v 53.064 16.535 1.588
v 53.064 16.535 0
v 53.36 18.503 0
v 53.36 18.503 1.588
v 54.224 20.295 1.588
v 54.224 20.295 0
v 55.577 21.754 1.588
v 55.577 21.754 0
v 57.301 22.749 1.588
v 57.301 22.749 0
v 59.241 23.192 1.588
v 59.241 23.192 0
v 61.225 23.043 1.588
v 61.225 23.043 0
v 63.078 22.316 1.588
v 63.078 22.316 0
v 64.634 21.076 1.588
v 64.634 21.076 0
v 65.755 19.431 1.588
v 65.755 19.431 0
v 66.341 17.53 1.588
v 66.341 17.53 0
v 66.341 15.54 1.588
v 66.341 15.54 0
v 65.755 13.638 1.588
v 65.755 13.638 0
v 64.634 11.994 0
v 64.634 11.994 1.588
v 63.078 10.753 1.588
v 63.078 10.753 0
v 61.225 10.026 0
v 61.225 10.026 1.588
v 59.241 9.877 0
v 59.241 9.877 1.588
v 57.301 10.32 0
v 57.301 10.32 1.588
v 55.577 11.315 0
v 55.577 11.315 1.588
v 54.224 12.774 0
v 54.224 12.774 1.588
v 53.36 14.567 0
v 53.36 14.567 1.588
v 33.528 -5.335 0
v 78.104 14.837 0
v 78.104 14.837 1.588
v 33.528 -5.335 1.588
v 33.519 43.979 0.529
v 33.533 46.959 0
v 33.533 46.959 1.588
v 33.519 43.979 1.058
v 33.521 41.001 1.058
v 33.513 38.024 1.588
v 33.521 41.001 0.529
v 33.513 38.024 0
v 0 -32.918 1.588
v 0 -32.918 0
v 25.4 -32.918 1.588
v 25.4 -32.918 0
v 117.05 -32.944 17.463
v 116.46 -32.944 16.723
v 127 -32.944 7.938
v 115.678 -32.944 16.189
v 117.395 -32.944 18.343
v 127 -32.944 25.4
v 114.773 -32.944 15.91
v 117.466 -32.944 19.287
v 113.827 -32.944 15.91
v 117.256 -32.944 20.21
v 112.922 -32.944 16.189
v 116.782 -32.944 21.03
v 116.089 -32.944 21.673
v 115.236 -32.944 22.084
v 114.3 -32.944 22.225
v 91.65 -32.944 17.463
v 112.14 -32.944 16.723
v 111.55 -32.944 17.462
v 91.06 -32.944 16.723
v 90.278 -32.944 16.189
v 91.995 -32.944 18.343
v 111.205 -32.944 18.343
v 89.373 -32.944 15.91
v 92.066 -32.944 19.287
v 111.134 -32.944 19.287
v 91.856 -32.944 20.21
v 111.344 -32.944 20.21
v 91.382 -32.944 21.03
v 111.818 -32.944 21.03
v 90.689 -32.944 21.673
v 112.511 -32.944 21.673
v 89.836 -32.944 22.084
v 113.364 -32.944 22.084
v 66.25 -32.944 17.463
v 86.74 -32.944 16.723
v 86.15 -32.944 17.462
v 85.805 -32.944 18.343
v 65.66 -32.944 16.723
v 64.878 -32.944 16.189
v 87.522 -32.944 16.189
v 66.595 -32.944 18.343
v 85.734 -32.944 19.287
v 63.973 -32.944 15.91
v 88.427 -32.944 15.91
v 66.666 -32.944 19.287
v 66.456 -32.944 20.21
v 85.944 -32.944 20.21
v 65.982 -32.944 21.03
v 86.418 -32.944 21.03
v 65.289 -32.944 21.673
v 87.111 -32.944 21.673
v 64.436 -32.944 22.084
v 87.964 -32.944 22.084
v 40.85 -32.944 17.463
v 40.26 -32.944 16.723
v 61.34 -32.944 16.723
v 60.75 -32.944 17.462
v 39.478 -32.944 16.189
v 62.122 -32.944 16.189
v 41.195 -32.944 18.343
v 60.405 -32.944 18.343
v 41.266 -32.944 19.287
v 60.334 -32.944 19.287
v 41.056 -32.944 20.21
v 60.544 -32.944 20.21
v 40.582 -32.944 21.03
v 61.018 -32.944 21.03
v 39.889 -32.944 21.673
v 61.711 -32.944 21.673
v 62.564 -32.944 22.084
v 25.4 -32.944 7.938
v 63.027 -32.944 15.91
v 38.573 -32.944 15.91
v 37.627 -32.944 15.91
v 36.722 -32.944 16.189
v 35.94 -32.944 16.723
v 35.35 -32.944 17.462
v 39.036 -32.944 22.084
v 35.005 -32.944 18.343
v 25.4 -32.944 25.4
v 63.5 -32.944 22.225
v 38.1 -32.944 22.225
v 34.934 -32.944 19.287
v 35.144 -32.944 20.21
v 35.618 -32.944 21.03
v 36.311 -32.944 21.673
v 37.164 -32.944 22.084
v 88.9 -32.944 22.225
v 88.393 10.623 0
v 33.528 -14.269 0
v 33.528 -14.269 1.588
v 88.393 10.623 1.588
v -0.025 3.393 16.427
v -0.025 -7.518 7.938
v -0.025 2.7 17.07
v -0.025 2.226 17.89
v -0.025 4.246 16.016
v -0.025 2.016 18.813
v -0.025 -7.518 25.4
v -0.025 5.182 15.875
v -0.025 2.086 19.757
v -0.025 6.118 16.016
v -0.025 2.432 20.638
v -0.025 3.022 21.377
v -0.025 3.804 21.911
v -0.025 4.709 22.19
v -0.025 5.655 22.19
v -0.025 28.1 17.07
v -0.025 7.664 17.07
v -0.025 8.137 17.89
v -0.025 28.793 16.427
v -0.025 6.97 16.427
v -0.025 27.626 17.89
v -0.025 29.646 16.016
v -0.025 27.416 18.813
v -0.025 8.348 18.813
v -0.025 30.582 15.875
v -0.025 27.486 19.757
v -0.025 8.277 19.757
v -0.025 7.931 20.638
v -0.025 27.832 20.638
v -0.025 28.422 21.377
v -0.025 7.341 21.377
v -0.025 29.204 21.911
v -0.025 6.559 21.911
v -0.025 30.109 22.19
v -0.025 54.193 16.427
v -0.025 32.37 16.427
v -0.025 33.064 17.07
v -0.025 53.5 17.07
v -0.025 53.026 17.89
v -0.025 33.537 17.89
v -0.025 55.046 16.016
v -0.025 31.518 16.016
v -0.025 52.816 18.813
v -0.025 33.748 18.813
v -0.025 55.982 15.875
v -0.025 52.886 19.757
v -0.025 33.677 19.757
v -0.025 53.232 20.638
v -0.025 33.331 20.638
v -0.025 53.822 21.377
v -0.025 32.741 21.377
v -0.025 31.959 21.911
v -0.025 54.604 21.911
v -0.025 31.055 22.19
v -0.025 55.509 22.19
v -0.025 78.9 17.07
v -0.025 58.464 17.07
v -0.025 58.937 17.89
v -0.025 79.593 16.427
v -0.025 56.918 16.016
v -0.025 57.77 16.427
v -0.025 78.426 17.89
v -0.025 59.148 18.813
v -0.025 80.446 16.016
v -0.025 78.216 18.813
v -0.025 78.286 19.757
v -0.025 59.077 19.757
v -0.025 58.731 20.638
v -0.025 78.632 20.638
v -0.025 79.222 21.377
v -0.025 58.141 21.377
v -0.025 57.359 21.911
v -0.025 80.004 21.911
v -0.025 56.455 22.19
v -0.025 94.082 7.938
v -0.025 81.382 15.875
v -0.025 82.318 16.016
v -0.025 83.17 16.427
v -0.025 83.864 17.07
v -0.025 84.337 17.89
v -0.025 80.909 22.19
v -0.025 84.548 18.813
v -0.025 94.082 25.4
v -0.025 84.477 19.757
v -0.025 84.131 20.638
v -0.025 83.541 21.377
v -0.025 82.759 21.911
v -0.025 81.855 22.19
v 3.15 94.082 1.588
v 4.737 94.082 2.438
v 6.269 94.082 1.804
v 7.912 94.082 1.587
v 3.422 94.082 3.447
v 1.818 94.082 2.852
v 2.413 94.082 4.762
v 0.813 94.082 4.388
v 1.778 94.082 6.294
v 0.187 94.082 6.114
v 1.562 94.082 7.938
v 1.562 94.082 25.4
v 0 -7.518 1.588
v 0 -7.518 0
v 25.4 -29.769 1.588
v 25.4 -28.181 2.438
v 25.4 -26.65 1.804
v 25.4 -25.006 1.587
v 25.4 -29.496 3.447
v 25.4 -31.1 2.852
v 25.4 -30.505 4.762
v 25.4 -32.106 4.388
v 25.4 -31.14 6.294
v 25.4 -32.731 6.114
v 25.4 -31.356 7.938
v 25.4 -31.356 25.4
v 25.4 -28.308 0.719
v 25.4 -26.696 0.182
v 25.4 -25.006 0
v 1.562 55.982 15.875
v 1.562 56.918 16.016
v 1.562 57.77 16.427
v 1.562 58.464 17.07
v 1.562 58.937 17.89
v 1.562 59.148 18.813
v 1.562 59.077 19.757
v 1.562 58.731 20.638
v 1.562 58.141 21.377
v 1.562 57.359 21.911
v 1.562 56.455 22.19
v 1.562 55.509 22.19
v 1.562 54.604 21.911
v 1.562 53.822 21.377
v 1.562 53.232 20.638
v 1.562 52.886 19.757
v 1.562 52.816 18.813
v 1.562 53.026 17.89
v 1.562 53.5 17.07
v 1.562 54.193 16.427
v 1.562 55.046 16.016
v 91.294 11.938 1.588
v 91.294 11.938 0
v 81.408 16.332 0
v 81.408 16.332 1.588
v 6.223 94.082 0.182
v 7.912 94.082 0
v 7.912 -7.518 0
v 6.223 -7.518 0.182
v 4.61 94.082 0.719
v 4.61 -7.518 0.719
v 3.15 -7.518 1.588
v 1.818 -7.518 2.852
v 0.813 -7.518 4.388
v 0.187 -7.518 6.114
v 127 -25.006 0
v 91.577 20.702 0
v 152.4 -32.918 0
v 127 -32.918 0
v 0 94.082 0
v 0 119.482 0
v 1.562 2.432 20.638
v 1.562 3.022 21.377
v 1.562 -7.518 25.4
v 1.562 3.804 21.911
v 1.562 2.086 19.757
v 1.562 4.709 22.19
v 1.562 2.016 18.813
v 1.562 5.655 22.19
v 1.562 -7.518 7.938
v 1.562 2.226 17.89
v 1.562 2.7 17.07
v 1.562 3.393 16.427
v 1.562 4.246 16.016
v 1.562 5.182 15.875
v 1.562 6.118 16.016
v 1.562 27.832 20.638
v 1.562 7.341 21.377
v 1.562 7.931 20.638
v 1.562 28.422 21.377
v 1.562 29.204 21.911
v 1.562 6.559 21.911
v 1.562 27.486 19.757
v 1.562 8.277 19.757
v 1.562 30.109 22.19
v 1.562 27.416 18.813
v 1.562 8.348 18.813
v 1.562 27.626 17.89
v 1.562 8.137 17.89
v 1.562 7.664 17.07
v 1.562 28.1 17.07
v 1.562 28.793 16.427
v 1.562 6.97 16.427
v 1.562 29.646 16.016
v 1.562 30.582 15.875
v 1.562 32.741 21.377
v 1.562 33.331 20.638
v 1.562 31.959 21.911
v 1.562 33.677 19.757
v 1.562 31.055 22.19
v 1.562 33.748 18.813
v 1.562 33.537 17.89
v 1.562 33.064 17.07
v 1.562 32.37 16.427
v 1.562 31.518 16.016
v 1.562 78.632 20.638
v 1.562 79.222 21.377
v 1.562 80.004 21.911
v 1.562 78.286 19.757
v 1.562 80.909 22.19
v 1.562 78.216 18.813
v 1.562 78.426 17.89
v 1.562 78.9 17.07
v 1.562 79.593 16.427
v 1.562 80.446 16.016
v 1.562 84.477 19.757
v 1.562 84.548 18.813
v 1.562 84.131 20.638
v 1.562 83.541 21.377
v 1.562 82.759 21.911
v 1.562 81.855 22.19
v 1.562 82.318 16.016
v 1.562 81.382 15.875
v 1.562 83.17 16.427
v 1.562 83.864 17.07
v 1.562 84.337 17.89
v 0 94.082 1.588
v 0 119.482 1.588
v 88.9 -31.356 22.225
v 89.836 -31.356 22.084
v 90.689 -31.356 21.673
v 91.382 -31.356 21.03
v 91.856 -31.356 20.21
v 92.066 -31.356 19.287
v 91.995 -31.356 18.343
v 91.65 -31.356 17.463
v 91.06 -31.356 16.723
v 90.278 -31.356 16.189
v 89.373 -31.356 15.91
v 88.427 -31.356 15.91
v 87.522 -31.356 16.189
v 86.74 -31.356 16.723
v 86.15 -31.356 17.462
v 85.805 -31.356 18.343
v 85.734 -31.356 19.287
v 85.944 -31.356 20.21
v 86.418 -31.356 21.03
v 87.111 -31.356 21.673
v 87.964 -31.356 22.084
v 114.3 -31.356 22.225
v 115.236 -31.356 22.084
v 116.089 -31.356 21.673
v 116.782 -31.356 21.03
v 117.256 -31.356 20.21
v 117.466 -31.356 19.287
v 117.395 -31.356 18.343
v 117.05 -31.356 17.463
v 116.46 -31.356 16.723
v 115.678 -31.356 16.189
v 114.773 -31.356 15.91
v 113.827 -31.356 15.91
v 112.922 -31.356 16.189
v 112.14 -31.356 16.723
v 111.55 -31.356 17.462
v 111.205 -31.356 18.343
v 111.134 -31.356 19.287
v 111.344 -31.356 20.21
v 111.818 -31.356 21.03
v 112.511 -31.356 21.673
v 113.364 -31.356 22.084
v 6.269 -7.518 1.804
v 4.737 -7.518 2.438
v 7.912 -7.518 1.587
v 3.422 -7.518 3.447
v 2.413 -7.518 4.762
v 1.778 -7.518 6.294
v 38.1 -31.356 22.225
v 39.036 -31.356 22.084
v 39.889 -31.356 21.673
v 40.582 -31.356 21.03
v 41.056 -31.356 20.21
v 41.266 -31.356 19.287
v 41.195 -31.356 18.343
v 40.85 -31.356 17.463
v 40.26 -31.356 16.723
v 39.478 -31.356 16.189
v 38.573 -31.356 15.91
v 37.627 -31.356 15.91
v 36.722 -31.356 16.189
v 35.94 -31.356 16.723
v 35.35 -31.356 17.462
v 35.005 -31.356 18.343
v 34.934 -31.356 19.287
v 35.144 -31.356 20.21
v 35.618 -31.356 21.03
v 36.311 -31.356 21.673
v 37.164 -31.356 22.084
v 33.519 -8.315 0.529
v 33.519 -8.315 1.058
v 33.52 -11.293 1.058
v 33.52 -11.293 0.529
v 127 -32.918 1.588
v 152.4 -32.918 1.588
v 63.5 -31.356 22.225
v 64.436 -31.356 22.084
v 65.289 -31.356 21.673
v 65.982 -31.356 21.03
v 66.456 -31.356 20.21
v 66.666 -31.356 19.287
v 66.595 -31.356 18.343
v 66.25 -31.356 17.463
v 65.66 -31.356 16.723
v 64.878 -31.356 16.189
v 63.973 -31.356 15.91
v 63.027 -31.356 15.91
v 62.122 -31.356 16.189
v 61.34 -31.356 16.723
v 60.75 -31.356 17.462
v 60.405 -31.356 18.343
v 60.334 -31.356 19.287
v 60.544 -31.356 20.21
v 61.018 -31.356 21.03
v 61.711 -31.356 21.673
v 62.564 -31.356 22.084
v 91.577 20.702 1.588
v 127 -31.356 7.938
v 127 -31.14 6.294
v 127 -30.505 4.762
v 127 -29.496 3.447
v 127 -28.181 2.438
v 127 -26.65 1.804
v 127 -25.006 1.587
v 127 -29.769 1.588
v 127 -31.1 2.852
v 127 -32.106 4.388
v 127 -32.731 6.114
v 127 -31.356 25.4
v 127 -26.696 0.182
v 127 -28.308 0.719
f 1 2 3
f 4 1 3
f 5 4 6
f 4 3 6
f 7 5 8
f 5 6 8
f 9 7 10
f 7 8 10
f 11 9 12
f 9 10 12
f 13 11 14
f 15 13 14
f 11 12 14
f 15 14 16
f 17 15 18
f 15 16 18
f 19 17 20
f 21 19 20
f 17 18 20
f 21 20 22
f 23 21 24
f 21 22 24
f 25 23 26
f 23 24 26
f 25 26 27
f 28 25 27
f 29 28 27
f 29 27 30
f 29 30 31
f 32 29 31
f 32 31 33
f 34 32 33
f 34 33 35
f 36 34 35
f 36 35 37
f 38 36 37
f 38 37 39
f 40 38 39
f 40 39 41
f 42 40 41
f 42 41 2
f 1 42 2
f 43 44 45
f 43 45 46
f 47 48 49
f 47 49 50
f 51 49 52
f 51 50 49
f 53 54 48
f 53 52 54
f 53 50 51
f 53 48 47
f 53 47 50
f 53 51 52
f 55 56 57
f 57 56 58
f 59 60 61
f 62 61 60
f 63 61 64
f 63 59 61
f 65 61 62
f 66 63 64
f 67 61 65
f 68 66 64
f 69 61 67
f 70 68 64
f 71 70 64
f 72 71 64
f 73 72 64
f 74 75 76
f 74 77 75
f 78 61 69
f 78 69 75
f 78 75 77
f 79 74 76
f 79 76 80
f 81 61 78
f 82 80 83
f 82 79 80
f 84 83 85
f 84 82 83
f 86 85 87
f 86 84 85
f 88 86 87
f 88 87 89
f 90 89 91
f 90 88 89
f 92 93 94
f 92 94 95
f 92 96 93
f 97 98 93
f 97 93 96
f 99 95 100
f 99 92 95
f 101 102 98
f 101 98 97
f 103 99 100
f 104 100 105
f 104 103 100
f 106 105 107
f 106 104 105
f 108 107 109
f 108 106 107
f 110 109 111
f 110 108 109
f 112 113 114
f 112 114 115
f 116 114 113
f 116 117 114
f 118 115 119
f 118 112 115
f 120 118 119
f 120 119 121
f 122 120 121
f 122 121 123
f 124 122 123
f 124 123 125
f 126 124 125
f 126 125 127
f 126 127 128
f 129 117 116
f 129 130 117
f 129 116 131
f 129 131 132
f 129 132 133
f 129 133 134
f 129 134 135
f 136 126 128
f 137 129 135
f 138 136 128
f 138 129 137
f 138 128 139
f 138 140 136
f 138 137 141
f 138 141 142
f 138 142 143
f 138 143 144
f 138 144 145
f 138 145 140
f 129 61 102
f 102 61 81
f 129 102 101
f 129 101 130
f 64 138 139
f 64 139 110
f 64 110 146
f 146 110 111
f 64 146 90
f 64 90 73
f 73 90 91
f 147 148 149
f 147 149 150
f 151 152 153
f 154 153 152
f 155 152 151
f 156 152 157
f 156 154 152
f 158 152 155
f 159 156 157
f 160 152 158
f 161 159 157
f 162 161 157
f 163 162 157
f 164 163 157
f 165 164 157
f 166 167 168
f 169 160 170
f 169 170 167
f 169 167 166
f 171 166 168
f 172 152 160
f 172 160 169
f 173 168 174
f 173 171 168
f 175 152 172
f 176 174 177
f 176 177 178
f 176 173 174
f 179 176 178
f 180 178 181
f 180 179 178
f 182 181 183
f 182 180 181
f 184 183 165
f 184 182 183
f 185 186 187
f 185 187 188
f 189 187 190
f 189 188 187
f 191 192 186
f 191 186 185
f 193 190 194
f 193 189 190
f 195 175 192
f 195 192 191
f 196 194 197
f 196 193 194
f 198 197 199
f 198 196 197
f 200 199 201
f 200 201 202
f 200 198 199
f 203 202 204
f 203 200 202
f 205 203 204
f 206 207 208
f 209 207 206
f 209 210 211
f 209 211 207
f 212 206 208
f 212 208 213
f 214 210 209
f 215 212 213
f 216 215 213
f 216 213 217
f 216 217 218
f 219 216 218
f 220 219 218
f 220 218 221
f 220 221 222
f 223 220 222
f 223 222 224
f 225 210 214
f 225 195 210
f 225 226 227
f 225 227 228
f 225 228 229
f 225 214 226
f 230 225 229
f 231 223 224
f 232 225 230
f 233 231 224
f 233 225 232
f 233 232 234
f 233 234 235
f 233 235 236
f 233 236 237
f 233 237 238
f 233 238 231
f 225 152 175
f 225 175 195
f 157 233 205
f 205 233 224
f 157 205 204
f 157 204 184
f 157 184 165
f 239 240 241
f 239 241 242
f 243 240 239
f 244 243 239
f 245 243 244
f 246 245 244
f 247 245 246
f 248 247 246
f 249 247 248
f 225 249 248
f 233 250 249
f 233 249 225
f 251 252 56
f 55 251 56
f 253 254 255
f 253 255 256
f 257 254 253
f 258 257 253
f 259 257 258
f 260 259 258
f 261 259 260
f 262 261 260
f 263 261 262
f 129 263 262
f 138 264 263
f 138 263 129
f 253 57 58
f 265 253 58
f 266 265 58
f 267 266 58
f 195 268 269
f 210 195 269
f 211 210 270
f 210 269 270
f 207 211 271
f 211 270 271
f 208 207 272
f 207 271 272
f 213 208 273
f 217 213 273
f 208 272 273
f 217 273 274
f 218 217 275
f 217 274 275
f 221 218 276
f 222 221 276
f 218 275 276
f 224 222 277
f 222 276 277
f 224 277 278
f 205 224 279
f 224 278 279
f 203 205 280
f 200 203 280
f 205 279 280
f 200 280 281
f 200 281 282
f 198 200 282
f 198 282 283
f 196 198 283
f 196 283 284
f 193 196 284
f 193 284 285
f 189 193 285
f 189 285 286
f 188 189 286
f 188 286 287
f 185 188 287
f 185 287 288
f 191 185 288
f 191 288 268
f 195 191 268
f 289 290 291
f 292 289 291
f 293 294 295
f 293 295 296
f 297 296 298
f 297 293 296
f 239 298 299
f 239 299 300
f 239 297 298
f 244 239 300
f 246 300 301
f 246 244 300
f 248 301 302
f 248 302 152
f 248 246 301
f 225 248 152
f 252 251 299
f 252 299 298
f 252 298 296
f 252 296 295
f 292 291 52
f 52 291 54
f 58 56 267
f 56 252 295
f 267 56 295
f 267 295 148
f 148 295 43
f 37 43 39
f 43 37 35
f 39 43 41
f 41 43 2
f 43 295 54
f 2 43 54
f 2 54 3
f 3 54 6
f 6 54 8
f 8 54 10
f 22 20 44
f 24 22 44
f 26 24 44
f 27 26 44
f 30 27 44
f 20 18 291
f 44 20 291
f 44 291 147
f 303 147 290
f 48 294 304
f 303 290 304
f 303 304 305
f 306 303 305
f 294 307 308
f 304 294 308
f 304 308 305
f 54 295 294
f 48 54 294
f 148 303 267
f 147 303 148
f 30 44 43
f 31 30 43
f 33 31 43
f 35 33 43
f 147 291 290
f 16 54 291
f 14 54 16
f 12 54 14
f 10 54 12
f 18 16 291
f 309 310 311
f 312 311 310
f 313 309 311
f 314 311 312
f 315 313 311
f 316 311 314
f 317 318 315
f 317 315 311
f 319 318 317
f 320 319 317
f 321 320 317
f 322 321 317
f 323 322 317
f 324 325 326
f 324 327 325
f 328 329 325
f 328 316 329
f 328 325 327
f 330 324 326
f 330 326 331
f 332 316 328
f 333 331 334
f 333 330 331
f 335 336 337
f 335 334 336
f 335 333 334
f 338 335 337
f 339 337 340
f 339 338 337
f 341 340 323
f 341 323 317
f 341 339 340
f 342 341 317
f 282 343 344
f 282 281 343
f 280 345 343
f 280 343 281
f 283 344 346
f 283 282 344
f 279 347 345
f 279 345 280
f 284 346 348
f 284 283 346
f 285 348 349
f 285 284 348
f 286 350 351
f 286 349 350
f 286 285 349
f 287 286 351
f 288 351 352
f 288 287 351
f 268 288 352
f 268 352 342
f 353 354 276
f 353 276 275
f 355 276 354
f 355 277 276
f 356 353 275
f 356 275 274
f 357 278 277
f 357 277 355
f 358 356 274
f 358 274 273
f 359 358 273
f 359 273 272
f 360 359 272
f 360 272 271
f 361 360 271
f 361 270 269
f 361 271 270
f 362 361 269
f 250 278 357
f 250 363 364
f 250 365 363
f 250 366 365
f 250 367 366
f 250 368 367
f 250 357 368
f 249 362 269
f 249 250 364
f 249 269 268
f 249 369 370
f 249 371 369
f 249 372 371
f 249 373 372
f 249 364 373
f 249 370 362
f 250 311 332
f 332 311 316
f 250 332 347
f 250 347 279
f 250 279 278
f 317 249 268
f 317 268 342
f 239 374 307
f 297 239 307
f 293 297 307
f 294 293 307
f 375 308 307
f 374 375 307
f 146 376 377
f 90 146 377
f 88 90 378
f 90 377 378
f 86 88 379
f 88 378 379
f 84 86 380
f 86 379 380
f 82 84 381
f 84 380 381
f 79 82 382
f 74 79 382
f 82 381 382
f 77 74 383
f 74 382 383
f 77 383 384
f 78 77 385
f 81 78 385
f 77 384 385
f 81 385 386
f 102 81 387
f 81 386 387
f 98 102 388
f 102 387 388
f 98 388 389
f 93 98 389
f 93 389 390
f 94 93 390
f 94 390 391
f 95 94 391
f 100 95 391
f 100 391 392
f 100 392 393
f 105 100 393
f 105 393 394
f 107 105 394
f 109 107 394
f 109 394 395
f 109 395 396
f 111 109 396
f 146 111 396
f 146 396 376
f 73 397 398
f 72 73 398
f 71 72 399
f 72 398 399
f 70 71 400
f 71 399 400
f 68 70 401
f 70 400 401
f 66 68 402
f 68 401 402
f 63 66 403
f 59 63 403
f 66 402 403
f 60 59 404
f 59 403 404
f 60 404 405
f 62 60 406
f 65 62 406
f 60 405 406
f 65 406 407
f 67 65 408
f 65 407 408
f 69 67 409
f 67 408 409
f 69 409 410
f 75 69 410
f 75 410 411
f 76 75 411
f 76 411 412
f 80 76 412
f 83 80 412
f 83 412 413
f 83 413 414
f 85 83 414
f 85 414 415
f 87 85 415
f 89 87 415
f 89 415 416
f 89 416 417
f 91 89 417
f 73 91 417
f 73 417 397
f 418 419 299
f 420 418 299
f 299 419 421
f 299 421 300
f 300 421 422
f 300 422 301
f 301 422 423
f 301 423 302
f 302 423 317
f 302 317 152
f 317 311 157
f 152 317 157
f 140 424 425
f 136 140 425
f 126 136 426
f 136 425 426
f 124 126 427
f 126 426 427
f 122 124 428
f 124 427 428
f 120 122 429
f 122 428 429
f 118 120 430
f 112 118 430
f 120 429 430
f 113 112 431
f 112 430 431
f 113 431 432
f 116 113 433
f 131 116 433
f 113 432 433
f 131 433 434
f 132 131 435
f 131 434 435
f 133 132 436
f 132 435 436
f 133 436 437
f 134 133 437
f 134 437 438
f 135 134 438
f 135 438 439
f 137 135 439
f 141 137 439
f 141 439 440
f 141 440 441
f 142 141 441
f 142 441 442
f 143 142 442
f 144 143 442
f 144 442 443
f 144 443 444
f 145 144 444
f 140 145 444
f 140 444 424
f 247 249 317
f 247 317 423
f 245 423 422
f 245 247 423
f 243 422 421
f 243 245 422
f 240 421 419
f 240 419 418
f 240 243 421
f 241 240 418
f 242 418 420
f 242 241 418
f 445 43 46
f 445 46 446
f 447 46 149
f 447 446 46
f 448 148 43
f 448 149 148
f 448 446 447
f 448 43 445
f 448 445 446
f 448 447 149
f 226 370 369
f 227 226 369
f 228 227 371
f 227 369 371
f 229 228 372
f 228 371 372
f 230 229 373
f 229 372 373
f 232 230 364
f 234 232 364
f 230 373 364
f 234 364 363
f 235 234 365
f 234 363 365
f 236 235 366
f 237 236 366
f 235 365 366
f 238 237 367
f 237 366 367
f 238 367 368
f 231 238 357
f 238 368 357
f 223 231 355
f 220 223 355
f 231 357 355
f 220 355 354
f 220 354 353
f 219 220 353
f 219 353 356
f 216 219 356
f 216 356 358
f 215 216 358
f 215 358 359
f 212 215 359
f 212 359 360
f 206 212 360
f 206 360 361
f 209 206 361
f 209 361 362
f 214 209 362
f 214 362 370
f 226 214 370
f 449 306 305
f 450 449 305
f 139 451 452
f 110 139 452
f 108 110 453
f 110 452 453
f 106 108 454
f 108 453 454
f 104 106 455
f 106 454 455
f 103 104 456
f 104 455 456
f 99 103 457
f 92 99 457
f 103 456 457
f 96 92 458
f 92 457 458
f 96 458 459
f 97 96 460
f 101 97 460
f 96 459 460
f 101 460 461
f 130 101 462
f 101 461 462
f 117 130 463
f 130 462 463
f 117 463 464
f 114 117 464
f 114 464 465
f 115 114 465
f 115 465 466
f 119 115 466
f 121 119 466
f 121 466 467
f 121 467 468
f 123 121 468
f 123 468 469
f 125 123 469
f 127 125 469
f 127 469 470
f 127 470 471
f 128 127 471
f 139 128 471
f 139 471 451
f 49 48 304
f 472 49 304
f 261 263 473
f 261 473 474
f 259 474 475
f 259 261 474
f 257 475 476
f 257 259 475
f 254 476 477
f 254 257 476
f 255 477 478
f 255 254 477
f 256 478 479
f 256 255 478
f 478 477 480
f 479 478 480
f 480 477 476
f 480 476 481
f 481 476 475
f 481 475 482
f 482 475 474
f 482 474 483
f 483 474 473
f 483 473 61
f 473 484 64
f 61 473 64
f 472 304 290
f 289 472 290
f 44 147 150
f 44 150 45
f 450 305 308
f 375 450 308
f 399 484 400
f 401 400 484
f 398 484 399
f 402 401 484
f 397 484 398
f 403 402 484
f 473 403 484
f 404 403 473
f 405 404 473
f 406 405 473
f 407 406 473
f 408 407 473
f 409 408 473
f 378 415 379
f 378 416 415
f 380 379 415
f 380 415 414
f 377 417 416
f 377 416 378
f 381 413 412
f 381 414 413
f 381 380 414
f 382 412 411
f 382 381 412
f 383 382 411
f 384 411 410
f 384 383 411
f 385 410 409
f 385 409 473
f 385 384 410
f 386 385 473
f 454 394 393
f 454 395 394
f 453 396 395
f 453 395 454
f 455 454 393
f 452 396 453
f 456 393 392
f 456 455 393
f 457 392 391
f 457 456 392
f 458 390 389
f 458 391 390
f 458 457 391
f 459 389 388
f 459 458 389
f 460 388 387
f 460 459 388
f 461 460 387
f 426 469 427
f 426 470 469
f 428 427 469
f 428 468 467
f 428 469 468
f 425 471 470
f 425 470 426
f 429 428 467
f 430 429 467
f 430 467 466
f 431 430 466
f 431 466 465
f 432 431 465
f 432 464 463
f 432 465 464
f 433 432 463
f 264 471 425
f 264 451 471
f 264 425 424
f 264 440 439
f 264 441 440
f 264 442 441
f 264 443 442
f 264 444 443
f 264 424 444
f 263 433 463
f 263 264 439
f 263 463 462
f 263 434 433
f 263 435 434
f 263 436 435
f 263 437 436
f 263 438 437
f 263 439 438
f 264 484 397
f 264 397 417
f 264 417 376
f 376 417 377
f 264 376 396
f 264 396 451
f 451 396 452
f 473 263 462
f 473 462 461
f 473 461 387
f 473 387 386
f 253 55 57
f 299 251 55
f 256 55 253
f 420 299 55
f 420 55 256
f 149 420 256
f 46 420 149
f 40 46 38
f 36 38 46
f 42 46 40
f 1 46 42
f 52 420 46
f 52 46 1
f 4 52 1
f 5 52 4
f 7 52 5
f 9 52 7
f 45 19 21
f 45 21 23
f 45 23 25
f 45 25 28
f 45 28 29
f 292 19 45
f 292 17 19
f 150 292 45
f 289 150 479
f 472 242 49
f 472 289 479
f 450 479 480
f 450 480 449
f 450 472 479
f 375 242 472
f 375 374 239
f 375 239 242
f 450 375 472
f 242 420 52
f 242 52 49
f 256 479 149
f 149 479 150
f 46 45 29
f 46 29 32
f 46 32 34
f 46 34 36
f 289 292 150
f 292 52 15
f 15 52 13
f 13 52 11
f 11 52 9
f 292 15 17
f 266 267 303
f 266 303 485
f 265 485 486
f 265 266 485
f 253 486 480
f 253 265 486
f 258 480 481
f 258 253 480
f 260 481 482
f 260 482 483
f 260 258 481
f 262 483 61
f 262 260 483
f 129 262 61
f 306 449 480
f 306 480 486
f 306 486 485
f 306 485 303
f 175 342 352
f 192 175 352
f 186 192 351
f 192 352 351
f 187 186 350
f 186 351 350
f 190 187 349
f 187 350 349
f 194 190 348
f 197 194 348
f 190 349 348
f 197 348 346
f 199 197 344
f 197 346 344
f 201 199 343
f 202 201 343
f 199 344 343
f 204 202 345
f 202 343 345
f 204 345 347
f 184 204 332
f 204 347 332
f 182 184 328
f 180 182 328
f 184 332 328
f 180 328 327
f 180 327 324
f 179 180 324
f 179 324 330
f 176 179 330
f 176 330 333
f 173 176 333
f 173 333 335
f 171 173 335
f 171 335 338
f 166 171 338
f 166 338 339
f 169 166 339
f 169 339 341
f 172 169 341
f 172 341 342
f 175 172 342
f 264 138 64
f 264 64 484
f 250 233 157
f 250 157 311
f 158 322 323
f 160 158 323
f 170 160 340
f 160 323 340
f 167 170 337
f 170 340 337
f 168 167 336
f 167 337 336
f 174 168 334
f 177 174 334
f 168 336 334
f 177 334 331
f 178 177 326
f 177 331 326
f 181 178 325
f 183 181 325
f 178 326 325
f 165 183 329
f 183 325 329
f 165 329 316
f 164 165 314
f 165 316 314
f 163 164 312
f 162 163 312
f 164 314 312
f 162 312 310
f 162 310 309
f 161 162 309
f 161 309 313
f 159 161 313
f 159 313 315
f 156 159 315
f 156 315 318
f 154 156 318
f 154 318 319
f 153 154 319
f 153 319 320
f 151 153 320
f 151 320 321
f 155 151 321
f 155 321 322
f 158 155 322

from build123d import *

# Parameters (mm, degrees)
BOSS_EXTRUDE1_DEPTH          = 1.5875
SKETCH7_W                    = 1.5875
SKETCH7_H                    = 101.6
BOSS_EXTRUDE2_DEPTH          = 0.0254
EDGE_FLANGE1_STRIP_W         = 19.05
EDGE_FLANGE1_STRIP_H         = 1.5875
EDGE_FLANGE1_STRIP_CUT_DEPTH = 101.6
EDGE_FLANGE1_DEPTH           = 101.6
SKETCH11_W                   = 101.6
SKETCH11_H                   = 1.5875
BOSS_EXTRUDE3_DEPTH          = 0.0254
EDGE_FLANGE2_STRIP_W         = 19.05
EDGE_FLANGE2_STRIP_H         = 1.5875
EDGE_FLANGE2_STRIP_CUT_DEPTH = 101.6
EDGE_FLANGE2_DEPTH           = 101.6
SKETCH15_R                   = 3.175
CUT_EXTRUDE1_DEPTH           = 2.54
SKETCH16_R                   = 3.175
CUT_EXTRUDE2_DEPTH           = 2.54
SKETCH18_R                   = 6.676012736
CUT_EXTRUDE5_DEPTH           = 2.54


# Sheet-metal steps are written as plain solids
with BuildPart() as part:
    # Sketch1 → Boss-Extrude1 (new body)
    with BuildSketch(Plane.XY):
        Polygon((0, 119.481843199), (0, -32.918156801), (152.4, -32.918156801), align=None)
    extrude(amount=BOSS_EXTRUDE1_DEPTH)

    # Sketch7 → Boss-Extrude2 (add)
    with BuildSketch(Plane.ZY):
        with Locations((0.79375, 43.281843199)):
            Rectangle(SKETCH7_W, SKETCH7_H)
    extrude(amount=BOSS_EXTRUDE2_DEPTH)

    # Edge-Flange1 strip (across the edge) → Edge-Flange1 strip cut (cut)
    with BuildSketch(Plane(origin=(-0.0254, 94.081843199, 1.5875), x_dir=(1, 0, 0), z_dir=(0, -1, 0))):
        with Locations((-1.5875, -0.79375)):
            Rectangle(EDGE_FLANGE1_STRIP_W, EDGE_FLANGE1_STRIP_H)
    extrude(amount=EDGE_FLANGE1_STRIP_CUT_DEPTH, mode=Mode.SUBTRACT)

    # Edge-Flange1 section (across the edge) → Edge-Flange1 (add)
    with BuildSketch(Plane(origin=(-0.0254, 94.081843199, 1.5875), x_dir=(1, 0, 0), z_dir=(0, -1, 0))):
        with BuildLine():
            Line((0, 6.35), (0, 23.8125))
            Line((0, 23.8125), (1.5875, 23.8125))
            Line((1.5875, 23.8125), (1.5875, 6.35))
            ThreePointArc((1.5875, 6.35), (3.447371939, 1.859871939), (7.9375, 0))
            Line((7.9375, 0), (7.9375, -1.5875))
            ThreePointArc((7.9375, -1.5875), (2.324839924, 0.737339924), (0, 6.35))
        make_face()
    extrude(amount=EDGE_FLANGE1_DEPTH)

    # Sketch11 → Boss-Extrude3 (add)
    with BuildSketch(Plane(origin=(0, -32.918156801, 0), x_dir=(-1, 0, 0), z_dir=(0, -1, 0))):
        with Locations((-76.2, -0.79375)):
            Rectangle(SKETCH11_W, SKETCH11_H)
    extrude(amount=BOSS_EXTRUDE3_DEPTH)

    # Edge-Flange2 strip (across the edge) → Edge-Flange2 strip cut (cut)
    with BuildSketch(Plane(origin=(25.4, -32.943556801, 1.5875), x_dir=(0, 1, 0), z_dir=(1, 0, 0))):
        with Locations((-1.5875, -0.79375)):
            Rectangle(EDGE_FLANGE2_STRIP_W, EDGE_FLANGE2_STRIP_H)
    extrude(amount=EDGE_FLANGE2_STRIP_CUT_DEPTH, mode=Mode.SUBTRACT)

    # Edge-Flange2 section (across the edge) → Edge-Flange2 (add)
    with BuildSketch(Plane(origin=(25.4, -32.943556801, 1.5875), x_dir=(0, 1, 0), z_dir=(1, 0, 0))):
        with BuildLine():
            Line((0, 6.35), (0, 23.8125))
            Line((0, 23.8125), (1.5875, 23.8125))
            Line((1.5875, 23.8125), (1.5875, 6.35))
            ThreePointArc((1.5875, 6.35), (3.447371939, 1.859871939), (7.9375, 0))
            Line((7.9375, 0), (7.9375, -1.5875))
            ThreePointArc((7.9375, -1.5875), (2.324839924, 0.737339924), (0, 6.35))
        make_face()
    extrude(amount=EDGE_FLANGE2_DEPTH)

    # Sketch15 → Cut-Extrude1 (cut)
    with BuildSketch(Plane(origin=(0, -31.356056801, 0), x_dir=(1, 0, 0), z_dir=(0, 1, 0))):
        with Locations(Location((38.1, -19.05, 0), (0, 0, 270))):
            Circle(SKETCH15_R)
        with Locations(Location((63.5, -19.05, 0), (0, 0, 270))):
            Circle(SKETCH15_R)
        with Locations(Location((88.9, -19.05, 0), (0, 0, 270))):
            Circle(SKETCH15_R)
        with Locations(Location((114.3, -19.05, 0), (0, 0, 270))):
            Circle(SKETCH15_R)
    extrude(amount=-CUT_EXTRUDE1_DEPTH, mode=Mode.SUBTRACT)

    # Sketch16 → Cut-Extrude2 (cut)
    with BuildSketch(Plane(origin=(1.5621, 0, 0), x_dir=(0, 0, -1), z_dir=(1, 0, 0))):
        with Locations((-19.05, 81.381843199)):
            Circle(SKETCH16_R)
        with Locations((-19.05, 55.981843199)):
            Circle(SKETCH16_R)
        with Locations((-19.05, 30.581843199)):
            Circle(SKETCH16_R)
        with Locations((-19.05, 5.181843199)):
            Circle(SKETCH16_R)
    extrude(amount=-CUT_EXTRUDE2_DEPTH, mode=Mode.SUBTRACT)

    # Sketch18 → Cut-Extrude5 (cut)
    with BuildSketch(Plane(origin=(0, 0, 0), x_dir=(-1, 0, 0), z_dir=(0, 0, -1))):
        with Locations((-59.739888133, 16.534721244)):
            Circle(SKETCH18_R)
        with BuildLine():
            Line((-88.393458916, 10.622584789), (-78.10421078, 14.837125247))
            Line((-78.10421078, 14.837125247), (-33.528048288, -5.335200069))
            add(Edge.make_bspline(
                [(-33.528048288, -5.335200069), (-33.513417888, -8.314924869), (-33.518294688, -11.294649669), (-33.528048288, -14.269497669)],
                knots=[0, 0, 0, 0, 1, 1, 1, 1], degree=3))
            Line((-33.528048288, -14.269497669), (-88.393458916, 10.622584789))
        make_face()
        with BuildLine():
            Line((-91.576598688, 20.702035131), (-91.293744288, 11.938425531))
            Line((-91.293744288, 11.938425531), (-81.408470688, 16.332422331))
            Line((-81.408470688, 16.332422331), (-33.513417888, 38.024428731))
            add(Edge.make_bspline(
                [(-33.532925088, 46.958726331), (-33.503664288, 43.979001531), (-33.532925088, 40.999276731), (-33.513417888, 38.024428731)],
                knots=[0, 0, 0, 0, 1, 1, 1, 1], degree=3))
            Line((-33.532925088, 46.958726331), (-91.576598688, 20.702035131))
        make_face()
    extrude(amount=-CUT_EXTRUDE5_DEPTH, mode=Mode.SUBTRACT)


solid = part.part
